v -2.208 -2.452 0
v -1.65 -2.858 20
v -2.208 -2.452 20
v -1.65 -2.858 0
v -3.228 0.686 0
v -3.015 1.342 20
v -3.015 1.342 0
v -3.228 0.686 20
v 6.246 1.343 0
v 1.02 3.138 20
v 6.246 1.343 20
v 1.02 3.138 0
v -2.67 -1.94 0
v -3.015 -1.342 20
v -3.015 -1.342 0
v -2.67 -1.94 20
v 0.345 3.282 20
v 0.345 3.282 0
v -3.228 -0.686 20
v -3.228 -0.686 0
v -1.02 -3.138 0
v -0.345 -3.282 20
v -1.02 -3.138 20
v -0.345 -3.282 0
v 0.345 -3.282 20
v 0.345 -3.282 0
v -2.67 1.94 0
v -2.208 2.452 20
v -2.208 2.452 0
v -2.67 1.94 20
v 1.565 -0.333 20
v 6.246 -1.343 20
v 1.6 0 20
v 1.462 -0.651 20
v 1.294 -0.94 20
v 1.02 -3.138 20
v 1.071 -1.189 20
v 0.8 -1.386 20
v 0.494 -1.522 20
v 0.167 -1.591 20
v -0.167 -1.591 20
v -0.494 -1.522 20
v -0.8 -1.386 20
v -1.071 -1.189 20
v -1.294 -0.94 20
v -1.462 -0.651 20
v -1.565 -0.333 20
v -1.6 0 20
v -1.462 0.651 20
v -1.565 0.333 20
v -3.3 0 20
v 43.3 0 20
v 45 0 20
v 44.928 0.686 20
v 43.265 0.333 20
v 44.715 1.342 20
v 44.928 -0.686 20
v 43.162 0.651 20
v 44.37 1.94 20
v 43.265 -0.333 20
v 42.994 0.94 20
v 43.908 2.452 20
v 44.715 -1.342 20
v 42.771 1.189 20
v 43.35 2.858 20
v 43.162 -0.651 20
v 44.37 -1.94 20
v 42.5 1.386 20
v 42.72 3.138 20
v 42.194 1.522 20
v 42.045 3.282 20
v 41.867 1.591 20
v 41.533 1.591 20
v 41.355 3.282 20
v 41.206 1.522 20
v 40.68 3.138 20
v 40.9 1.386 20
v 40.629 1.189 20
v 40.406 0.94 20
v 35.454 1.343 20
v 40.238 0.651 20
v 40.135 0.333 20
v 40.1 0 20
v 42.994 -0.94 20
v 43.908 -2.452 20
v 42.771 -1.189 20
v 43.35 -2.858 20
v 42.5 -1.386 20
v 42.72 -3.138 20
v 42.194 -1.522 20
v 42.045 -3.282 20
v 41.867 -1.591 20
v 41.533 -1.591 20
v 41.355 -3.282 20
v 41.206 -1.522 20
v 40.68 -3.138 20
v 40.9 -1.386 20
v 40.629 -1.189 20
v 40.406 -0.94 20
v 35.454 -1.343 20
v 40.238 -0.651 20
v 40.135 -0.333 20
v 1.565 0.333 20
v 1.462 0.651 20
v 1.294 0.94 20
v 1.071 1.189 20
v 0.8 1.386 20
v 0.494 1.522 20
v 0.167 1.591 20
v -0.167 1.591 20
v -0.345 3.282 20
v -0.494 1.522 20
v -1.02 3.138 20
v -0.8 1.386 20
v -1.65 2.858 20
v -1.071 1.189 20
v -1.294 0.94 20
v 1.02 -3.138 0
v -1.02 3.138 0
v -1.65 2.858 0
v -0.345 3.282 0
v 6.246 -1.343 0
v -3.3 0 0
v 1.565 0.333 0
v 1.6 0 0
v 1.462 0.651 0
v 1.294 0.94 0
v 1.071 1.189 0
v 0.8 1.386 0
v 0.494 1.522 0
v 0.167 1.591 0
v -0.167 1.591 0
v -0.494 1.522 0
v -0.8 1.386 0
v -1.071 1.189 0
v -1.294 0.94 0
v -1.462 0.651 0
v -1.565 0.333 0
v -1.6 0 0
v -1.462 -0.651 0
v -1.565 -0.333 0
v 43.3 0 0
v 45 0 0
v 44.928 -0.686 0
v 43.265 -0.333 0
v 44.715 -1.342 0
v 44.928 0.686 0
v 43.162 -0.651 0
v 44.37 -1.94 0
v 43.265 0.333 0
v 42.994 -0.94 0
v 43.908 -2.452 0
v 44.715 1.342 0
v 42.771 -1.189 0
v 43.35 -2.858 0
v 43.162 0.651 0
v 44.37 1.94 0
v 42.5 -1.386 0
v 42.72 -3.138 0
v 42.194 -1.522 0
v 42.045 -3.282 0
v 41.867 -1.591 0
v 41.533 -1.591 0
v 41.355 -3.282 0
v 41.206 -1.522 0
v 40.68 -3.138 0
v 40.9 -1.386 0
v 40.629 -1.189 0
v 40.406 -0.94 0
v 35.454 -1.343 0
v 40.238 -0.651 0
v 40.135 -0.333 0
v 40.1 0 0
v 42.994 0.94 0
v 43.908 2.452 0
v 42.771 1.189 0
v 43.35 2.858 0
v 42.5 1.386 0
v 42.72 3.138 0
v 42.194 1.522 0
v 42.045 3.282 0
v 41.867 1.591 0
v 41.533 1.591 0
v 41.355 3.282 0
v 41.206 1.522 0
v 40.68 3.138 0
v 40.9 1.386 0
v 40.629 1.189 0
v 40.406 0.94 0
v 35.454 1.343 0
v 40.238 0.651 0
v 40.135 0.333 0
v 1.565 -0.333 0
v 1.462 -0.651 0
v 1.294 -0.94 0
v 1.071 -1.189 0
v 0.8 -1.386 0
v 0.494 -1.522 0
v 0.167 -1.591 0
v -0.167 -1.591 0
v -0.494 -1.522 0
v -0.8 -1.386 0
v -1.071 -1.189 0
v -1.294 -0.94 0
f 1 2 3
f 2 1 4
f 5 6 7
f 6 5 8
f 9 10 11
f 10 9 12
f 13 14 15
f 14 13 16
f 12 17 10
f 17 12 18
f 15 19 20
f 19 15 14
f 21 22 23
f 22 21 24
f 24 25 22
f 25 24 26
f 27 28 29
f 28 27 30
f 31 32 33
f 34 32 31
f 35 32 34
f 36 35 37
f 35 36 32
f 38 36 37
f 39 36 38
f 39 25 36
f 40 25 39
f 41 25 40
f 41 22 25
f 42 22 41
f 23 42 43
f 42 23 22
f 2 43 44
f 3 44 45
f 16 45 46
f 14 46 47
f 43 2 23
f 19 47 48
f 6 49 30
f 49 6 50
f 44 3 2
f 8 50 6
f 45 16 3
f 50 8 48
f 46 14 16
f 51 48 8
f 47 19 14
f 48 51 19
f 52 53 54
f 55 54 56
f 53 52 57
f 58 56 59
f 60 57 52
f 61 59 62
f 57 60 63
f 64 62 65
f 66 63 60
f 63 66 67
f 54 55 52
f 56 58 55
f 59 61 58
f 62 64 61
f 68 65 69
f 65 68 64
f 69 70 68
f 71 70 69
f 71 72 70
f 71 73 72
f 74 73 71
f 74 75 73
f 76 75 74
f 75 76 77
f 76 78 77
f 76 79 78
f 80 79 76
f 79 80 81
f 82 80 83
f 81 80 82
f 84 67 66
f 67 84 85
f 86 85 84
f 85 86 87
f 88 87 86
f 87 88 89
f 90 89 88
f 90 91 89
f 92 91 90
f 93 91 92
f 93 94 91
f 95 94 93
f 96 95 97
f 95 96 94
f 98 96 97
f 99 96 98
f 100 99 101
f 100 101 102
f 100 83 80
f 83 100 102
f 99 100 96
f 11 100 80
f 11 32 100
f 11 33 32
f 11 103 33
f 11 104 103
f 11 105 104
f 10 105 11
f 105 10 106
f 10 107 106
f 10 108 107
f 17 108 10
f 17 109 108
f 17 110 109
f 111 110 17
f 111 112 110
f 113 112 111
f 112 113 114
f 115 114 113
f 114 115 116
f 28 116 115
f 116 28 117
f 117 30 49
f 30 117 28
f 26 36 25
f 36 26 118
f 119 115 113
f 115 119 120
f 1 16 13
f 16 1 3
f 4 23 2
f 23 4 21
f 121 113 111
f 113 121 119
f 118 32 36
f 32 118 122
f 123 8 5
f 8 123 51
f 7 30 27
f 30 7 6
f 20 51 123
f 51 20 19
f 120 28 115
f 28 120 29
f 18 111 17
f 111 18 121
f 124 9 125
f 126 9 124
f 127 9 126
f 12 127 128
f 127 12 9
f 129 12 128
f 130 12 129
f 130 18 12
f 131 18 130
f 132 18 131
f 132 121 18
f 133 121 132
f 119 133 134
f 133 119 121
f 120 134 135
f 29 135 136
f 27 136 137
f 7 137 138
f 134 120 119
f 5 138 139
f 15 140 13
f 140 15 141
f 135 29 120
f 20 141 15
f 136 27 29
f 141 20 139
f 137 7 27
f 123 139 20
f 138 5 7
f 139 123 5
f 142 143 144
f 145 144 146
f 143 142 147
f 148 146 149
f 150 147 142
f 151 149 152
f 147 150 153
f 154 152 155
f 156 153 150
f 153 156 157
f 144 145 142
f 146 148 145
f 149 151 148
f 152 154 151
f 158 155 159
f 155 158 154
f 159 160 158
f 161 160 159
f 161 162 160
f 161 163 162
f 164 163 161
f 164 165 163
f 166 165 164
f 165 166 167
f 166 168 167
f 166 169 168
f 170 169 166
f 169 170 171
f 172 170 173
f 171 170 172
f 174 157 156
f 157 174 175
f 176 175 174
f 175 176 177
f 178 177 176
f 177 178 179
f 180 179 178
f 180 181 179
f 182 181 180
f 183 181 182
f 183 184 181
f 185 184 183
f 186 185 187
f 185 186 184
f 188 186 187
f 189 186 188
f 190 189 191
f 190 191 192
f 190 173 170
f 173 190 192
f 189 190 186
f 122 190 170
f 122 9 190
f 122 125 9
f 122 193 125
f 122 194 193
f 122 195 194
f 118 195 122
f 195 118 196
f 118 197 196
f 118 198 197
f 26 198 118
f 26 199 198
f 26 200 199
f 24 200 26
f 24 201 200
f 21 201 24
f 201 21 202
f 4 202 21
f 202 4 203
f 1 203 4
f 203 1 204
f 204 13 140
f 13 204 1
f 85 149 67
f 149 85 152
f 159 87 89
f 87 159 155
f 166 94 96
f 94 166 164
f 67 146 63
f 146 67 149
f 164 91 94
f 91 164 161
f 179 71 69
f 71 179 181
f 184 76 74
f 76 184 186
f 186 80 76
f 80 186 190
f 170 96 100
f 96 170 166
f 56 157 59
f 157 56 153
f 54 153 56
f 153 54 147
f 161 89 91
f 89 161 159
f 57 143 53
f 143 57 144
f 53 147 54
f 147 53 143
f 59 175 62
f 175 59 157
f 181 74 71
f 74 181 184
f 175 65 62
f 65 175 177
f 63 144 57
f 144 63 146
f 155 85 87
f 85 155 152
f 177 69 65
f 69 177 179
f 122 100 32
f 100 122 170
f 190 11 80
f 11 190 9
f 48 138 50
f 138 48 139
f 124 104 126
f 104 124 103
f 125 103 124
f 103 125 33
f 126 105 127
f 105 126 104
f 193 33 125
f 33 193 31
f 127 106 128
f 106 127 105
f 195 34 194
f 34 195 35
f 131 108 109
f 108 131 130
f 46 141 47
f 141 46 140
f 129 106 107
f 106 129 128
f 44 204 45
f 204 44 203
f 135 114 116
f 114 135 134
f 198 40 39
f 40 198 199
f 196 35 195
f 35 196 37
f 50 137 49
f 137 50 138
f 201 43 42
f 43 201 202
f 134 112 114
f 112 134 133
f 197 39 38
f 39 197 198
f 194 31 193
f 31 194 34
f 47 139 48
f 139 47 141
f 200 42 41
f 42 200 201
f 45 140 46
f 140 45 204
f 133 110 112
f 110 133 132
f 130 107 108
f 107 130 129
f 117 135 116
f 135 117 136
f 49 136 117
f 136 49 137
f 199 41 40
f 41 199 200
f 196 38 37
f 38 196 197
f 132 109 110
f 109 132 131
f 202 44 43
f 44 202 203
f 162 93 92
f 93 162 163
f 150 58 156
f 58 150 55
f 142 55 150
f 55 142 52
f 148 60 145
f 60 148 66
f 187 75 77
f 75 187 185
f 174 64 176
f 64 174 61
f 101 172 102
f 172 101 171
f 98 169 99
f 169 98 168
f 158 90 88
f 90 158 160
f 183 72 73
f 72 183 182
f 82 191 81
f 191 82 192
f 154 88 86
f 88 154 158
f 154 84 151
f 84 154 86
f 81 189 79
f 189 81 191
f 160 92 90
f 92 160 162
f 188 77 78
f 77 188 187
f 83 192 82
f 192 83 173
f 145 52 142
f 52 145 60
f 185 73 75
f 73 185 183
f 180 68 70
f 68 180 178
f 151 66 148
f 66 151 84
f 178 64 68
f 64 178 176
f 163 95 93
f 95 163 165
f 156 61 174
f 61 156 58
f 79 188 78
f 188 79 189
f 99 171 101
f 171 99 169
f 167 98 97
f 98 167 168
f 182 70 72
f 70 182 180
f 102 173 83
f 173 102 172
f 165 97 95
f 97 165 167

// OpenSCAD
$fn=30;

w1 = 20;
l1 = 42;
h1 = 8;
w12 = 18;
h12 = 20;
w13 = 18;
mounth=50;
mountw=55;
w14 = mountw;
h13 = 2;
d1 = 3;
supportoffset = 13;
supporth = 35;
supportw = 18;

r3 = 8;
e3 = 10;
h3b = 2;
h3c = 10;

p5r = 12.0;
p5l = 150;
p5h = 3;
p5w = 2*p5r;
p5e = e3;
p5centerw = 22;
p5supporth = 35;
p5supportgap = 13;
p5highsupportw = 40;
p5supportoffset = 18;
p5attachw = 10;

internalcircled = 22+1.5;
screw_offsetw = 31;
screw_d = 2+2;
nemaw = 42;

//p4r = 12.0;
p4l = 100;
p4d = 12.0;

module p4(){
    translate([0, 0, 0])
    rotate([0, 0, 90]){
    translate([-p4l-p5supportgap*2*d1+10, 0, 0])
    linear_extrude(p4d){
    union(){
        hull(){
            circle(d=d1);
            translate([p4l, 0, 0]) square(d1,center=true);
        }
        
        circler = p5supportgap+2*d1+10;
        circler2 = circler - d1;
        difference(){
            translate([p4l+circler, 0, 0]) circle(r=circler);
            translate([p4l+circler, 0, 0]) circle(r=circler2);
            translate([p4l+circler+5000, 0, 0]) square([10000, 10000], center=true);
        }
        
        hull(){
            translate([p4l+circler-d1/2, circler-d1*0.6, 0]) square(d1,center=true);
            translate([p4l+circler+20, circler-d1*0.6, 0]) square(d1,center=true);
        }
        
        hull(){
            translate([p4l+circler-d1/2, -circler+d1*0.6, 0]) square(d1,center=true);
            translate([p4l+circler+20, -circler+d1*0.6, 0]) square(d1,center=true);
        }
    }
    }
    }
    
//    hull(){
//    }
}

module p2(){
    // todo
}

module p5_simpleattachment(){
    mr = 3.3;
    mr2 = 1.35;
    hr = 3.2/2;
    h = 20;
    d = 45;
    difference(){
        union(){
            hull(){
                cylinder(r=mr, h=h);
                translate([mr+mr2*2, 0, 0]) cylinder(r=mr2, h=h);
            }
            hull(){
                translate([d-2*mr-mr2*2, 0, 0]) cylinder(r=mr2, h=h);
                translate([d-mr, 0, 0]) cylinder(r=mr, h=h);
            }
            hull(){
                translate([mr+mr2*2, 0, 0]) cylinder(r=mr2, h=h);
                translate([d-2*mr-mr2*2, 0, 0]) cylinder(r=mr2, h=h);
            }
            
        }
        translate([0, 0, -1]) cylinder(r=hr, h=h+2);
        translate([d-mr, 0, -1]) cylinder(r=hr, h=h+2);
    }
}

module axis1(){
//    p1();
//    p2();
//    p3();
//    p4();
//    p5();
    p5_simpleattachment();
}

axis1();

module p5(){
    difference(){
        union(){
            translate([0, 0, h1+h12+mounth/2]){
                rotate([0, -90, 0]){
                    // arm base plate (mount side)
                    intersection(){
                        translate([0, 0, p5centerw/2-p5h/2]) {
                            linear_extrude(p5h){
                                hull(){
                                    translate([0, 0, 0]) circle(r=p5r);
                                    translate([p5l, 0, 0]) circle(r=p5r);
                                }
                            }
                        }
                        translate([500+mounth/2-0.1, 0, 0]) cube([1000, 1000, 1000], center=true);
                    }
                    
                    // arm base plate (not mount side)
                    translate([0, 0, -p5centerw/2-p5h/2]){
                        linear_extrude(p5h){
                            hull(){
                                circle(r=p5r);
                                translate([p5l, 0, 0]) circle(r=p5r);
                            }
                        }
                    }
                    
                    // cylinder
                    translate([d1, 0, -p5centerw/2-h3c-d1/2+0.01])
                        cylinderMount();
                    
                    // mount support
                    translate([-mounth/2, mountw/2, p5centerw/2-d1/2])
                        rotate([0, -90, 180])
                            nema17mount();
                    
                    // support plates
                    // mount side
                    difference(){
                        union(){
                            rotate([90, 0, 0]){
                                translate([mounth/2+p5supportoffset, p5centerw/2, p5r-d1])
                                    linear_extrude(d1)
                                        square([p5supporth, p5attachw]);
                                translate([mounth/2+p5supportoffset, p5centerw/2, -p5r])
                                    linear_extrude(d1)
                                        square([p5supporth, p5attachw]);
                            }
                            rotate([90, 0, 0]){
                                translate([mounth/2+p5supporth +p5supportoffset+p5supportgap, p5centerw/2, p5r-d1])
                                    linear_extrude(d1)
                                        square([p5supporth, p5attachw]);
                                translate([mounth/2+p5supporth +p5supportoffset+p5supportgap, p5centerw/2, -p5r])
                                    linear_extrude(d1)
                                        square([p5supporth, p5attachw]);
                            }
                        }
                        translate([mounth/2+p5supportoffset+p5supporth/2, p5r+5, p5centerw/2+p5attachw/2]) rotate([90, 0, 0]) cylinder(r=1.9, h=2*p5r+10);
                        translate([mounth/2+p5supportoffset+p5supporth/2+p5supportgap+p5supporth, p5r+5, p5centerw/2+p5attachw/2]) rotate([90, 0, 0]) cylinder(r=1.9, h=2*p5r+10);
                    }
                    
                    // non-mount side
                    difference(){
                        union(){
                            rotate([90, 0, 0]){
                                translate([mounth/2+p5supportoffset, -p5centerw/2-p5attachw, p5r-d1])
                                    linear_extrude(d1)
                                        square([p5supporth, p5attachw]);
                                translate([mounth/2+p5supportoffset, -p5centerw/2-p5attachw, -p5r])
                                    linear_extrude(d1)
                                        square([p5supporth, p5attachw]);
                            }
                            rotate([90, 0, 0]){
                                translate([mounth/2+p5supporth +p5supportoffset+p5supportgap, -p5centerw/2-p5attachw, p5r-d1])
                                    linear_extrude(d1)
                                        square([p5supporth, p5attachw]);
                                translate([mounth/2+p5supporth +p5supportoffset+p5supportgap, -p5centerw/2-p5attachw, -p5r])
                                    linear_extrude(d1)
                                        square([p5supporth, p5attachw]);
                            }
                        }
                        translate([mounth/2+p5supportoffset+p5supporth/2, p5r+5, -p5centerw/2-p5attachw/2]) rotate([90, 0, 0]) cylinder(r=1.9, h=2*p5r+10);
                        translate([mounth/2+p5supportoffset+p5supporth/2+p5supportgap+p5supporth, p5r+5, -p5centerw/2-p5attachw/2]) rotate([90, 0, 0]) cylinder(r=1.9, h=2*p5r+10);
                    }
                }
            }
        }
        
        // negative(s)
                translate([-500000, 0, h1+h12+p5l+mounth/2]) rotate([0, 90, 0]) cylinder(r=2.6, h=999999);

    }        
}


module p1(){
    translate([-r3-e3, -w1/2, 0]) linear_extrude(h1) square([l1+r3+e3, w1]);
    
    difference(){
        hull(){
            translate([l1-(r3+e3), -w1/2, h1]) linear_extrude(h1) square([w12, w1]);
            translate([l1-(r3+e3), -w14/2, h1+h12]) linear_extrude(h13) square([w13, w14]);
        }
        
        // negative
        hull(){
            translate([l1-(r3+e3)+d1+1, -w1/2 + d1, h1]) cube([100, w1-2*d1, 0.1]);
            translate([l1-(r3+e3)+d1, -w14/2 + d1, h1+h12]) cube([100, w14-2*d1, 0.01]);
        }
    }
    
    //mount
    translate([l1-(r3+e3), -mountw/2, h1+h12])
        nema17mount();
}

module p3(){
    w1temp = 2*(r3+e3);
    w2temp = 2*(r3);
    
    translate([-w1temp/2, -w2temp/2, -h3b]) linear_extrude(h3b) square([w1temp, w2temp]);
    
    translate([0, 0, -h3b-h3c+0.01])
        cylinderMount();
}


module flatheadHole(h){
    intersection(){
        cylinder(d=5, h=h);
        translate([-1.5, -5, 0]) cube([10, 10, 100]);
    }
}

module cylinderMount(){
    difference(){
        cylinder(r=r3, h=h3c);
        translate([0, 0, -0.1]) flatheadHole(h=h3c+0.2);
    }
}

module ra_triangle(base, height, depth){
    points = [[0, 0], [base, 0], [base, height]];
    
    translate([-base, 0, -depth/2]) linear_extrude(depth) polygon(points=points);
}

module nema17mount(){
    difference(){
        union(){
            //mount
            translate([+d1/2, mountw/2, mounth/2]) cube([d1, mountw, mounth], center=true);
            
            // mount support
            translate([0, d1/2, d1-0.01]) rotate([90, 0, 180]) ra_triangle(supportw, supporth, d1);
            translate([0, mountw-d1/2, d1-0.01]) rotate([90, 0, 180]) ra_triangle(supportw, supporth, d1);
                    
            // mount base
            translate([0, 0, 0]){
                rotate([0, 0, 0]){
                    linear_extrude(d1){
                        square([supportw, mountw]);
                    }
                }
            }
        }
        
        // negative(s)
        
        // center hole
        rotate([0, 90, 0]) translate([-mounth/2-d1, mountw/2, -0.1]) cylinder(d=internalcircled, h=d1+0.2);
        
        // screw holes
        rotate([0, 90, 0]) translate([-mounth/2-d1 + 0.5 * screw_offsetw, mountw/2 + 0.5 * screw_offsetw, -0.1]) cylinder(d=screw_d, h=d1+0.2);
        rotate([0, 90, 0]) translate([-mounth/2-d1 - 0.5 * screw_offsetw, mountw/2 - 0.5 * screw_offsetw, -0.1]) cylinder(d=screw_d, h=d1+0.2);
        rotate([0, 90, 0]) translate([-mounth/2-d1 - 0.5 * screw_offsetw, mountw/2 + 0.5 * screw_offsetw, -0.1]) cylinder(d=screw_d, h=d1+0.2);
        rotate([0, 90, 0]) translate([-mounth/2-d1 + 0.5 * screw_offsetw, mountw/2 - 0.5 * screw_offsetw, -0.1]) cylinder(d=screw_d, h=d1+0.2);
    }
}
